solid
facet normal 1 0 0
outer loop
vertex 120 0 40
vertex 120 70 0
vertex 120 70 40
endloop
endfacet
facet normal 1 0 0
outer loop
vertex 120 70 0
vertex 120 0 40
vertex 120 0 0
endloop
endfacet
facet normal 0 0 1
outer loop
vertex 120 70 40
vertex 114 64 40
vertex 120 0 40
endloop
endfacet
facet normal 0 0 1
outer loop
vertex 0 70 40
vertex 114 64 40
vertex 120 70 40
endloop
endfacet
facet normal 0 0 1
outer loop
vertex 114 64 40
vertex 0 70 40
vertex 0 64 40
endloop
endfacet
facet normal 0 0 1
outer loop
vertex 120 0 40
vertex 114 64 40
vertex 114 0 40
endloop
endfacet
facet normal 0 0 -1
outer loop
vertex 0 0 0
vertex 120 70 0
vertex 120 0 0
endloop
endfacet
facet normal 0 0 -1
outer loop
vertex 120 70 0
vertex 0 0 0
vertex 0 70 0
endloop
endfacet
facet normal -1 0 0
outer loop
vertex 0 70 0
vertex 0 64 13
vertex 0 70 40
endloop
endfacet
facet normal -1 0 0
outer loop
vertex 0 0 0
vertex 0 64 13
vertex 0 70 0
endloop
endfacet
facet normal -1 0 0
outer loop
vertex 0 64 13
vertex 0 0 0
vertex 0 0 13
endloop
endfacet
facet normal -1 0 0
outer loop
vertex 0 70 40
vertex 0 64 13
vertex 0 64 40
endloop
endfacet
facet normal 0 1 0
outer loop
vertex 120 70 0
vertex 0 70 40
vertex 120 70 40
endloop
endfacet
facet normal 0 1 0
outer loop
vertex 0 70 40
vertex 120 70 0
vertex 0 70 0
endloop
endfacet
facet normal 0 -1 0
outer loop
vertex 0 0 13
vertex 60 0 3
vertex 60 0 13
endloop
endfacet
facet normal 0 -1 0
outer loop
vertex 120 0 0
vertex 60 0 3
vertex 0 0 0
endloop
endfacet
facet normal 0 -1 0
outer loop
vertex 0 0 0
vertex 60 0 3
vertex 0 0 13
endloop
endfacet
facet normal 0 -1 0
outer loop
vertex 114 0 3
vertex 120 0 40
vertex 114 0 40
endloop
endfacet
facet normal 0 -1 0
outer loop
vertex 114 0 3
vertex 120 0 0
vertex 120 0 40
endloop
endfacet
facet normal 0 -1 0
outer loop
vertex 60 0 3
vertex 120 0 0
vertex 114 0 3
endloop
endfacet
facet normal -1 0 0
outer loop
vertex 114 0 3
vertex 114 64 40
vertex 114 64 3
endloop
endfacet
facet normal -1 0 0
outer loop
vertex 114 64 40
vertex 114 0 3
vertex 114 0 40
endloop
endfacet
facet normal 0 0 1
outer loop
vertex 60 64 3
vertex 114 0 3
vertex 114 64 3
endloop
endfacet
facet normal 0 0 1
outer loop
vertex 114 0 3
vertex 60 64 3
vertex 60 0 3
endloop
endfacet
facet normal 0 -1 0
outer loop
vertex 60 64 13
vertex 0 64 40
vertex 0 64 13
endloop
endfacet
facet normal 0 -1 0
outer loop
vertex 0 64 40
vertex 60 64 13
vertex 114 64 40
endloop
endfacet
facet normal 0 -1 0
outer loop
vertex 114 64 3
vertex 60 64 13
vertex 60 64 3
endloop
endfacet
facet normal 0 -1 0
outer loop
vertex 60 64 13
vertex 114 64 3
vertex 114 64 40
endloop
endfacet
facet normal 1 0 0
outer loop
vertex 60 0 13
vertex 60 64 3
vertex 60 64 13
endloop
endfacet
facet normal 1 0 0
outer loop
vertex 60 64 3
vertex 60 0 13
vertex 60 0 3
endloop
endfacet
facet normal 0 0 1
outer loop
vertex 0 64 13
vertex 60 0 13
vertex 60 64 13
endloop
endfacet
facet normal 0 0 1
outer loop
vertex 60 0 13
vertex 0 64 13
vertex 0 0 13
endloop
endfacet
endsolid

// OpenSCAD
// Buffer tank for mini horizontal gel-electrophoresis box
// Dimensions in millimetres (mm)

// Outer dimensions
outer_x = 120;
outer_y = 70;
outer_z = 40;

// Wall and floor thickness
wall_thickness = 3;
floor_thickness = 3;

// Platform dimensions
platform_length_x = 60;
platform_height_offset = 10; // Height above inner floor
platform_width_y = outer_y - 2 * wall_thickness; // Spans full inner width

// Electrode hole dimensions
hole_diameter = 2;
hole_z = 30;
hole_y = 0;

// Calculate inner dimensions
inner_x = outer_x - 2 * wall_thickness;
inner_y = outer_y - 2 * wall_thickness;
inner_z = outer_z - floor_thickness;

// Calculate platform top Z position
// Floor is at z=3. Platform top is 10mm above floor.
platform_top_z = floor_thickness + platform_height_offset;
// Platform bottom is at floor_thickness (z=3)

// Calculate hole position relative to bottom
// Hole is at z=30.

// Main assembly module
module tank_body() {
    // Create the outer shell
    difference() {
        // Outer solid block
        // Bottom at z=0, Top at z=40
        cube([outer_x, outer_y, outer_z], center = false);
        
        // Subtract inner cavity
        // Cavity starts at z=3 (floor thickness)
        // Cavity size: inner_x, inner_y, inner_z
        translate([0, 0, floor_thickness])
            cube([inner_x, inner_y, inner_z], center = false);
    }
}

module platform() {
    // Platform is a solid block
    // Centered in X, spans full inner Y
    // Bottom at z=3 (floor), Top at z=13
    translate([0, 0, floor_thickness])
        cube([platform_length_x, platform_width_y, platform_height_offset], center = false);
}

module electrode_holes() {
    // Two holes, one at each X end (left and right)
    // Hole center at y=0, z=30
    // Hole diameter 2mm
    // The holes must extend past the walls to ensure clean cuts
    
    // Left hole (at x = -outer_x/2)
    // We use a cylinder that is tall enough to cut through the wall
    // Wall is at x = -60. Hole center at -60.
    // Cylinder extends from x = -60 - 1 to x = -60 + 1 (diameter 2)
    // But we need to cut through the wall. The wall is at x = -60.
    // The cylinder should be centered at x = -60.
    // To ensure it cuts the wall, we make it slightly longer than the wall thickness?
    // Actually, the cylinder is the cutting tool.
    // The wall is at x = -60. The cylinder center is at x = -60.
    // The cylinder radius is 1. So it covers x from -61 to -59.
    // The wall is at x = -60. The cylinder cuts through it.
    // We need to ensure the cylinder extends in Y and Z to cut the wall.
    // Z: 30. Wall height is 40. Cylinder height needs to be > 40.
    // Y: 0. Wall width is 70. Cylinder height (along Y) needs to be > 70.
    
    // Left hole
    translate([-outer_x/2, 0, hole_z])
        cylinder(d = hole_diameter, h = outer_z + 10, center = true);
        
    // Right hole
    translate([outer_x/2, 0, hole_z])
        cylinder(d = hole_diameter, h = outer_z + 10, center = true);
}

// Main assembly
// We need to subtract the holes from the tank body, then union the platform.
// The platform is inside the tank.

union() {
    // Tank body with holes
    difference() {
        tank_body();
        electrode_holes();
    }
    
    // Platform
    platform();
}
